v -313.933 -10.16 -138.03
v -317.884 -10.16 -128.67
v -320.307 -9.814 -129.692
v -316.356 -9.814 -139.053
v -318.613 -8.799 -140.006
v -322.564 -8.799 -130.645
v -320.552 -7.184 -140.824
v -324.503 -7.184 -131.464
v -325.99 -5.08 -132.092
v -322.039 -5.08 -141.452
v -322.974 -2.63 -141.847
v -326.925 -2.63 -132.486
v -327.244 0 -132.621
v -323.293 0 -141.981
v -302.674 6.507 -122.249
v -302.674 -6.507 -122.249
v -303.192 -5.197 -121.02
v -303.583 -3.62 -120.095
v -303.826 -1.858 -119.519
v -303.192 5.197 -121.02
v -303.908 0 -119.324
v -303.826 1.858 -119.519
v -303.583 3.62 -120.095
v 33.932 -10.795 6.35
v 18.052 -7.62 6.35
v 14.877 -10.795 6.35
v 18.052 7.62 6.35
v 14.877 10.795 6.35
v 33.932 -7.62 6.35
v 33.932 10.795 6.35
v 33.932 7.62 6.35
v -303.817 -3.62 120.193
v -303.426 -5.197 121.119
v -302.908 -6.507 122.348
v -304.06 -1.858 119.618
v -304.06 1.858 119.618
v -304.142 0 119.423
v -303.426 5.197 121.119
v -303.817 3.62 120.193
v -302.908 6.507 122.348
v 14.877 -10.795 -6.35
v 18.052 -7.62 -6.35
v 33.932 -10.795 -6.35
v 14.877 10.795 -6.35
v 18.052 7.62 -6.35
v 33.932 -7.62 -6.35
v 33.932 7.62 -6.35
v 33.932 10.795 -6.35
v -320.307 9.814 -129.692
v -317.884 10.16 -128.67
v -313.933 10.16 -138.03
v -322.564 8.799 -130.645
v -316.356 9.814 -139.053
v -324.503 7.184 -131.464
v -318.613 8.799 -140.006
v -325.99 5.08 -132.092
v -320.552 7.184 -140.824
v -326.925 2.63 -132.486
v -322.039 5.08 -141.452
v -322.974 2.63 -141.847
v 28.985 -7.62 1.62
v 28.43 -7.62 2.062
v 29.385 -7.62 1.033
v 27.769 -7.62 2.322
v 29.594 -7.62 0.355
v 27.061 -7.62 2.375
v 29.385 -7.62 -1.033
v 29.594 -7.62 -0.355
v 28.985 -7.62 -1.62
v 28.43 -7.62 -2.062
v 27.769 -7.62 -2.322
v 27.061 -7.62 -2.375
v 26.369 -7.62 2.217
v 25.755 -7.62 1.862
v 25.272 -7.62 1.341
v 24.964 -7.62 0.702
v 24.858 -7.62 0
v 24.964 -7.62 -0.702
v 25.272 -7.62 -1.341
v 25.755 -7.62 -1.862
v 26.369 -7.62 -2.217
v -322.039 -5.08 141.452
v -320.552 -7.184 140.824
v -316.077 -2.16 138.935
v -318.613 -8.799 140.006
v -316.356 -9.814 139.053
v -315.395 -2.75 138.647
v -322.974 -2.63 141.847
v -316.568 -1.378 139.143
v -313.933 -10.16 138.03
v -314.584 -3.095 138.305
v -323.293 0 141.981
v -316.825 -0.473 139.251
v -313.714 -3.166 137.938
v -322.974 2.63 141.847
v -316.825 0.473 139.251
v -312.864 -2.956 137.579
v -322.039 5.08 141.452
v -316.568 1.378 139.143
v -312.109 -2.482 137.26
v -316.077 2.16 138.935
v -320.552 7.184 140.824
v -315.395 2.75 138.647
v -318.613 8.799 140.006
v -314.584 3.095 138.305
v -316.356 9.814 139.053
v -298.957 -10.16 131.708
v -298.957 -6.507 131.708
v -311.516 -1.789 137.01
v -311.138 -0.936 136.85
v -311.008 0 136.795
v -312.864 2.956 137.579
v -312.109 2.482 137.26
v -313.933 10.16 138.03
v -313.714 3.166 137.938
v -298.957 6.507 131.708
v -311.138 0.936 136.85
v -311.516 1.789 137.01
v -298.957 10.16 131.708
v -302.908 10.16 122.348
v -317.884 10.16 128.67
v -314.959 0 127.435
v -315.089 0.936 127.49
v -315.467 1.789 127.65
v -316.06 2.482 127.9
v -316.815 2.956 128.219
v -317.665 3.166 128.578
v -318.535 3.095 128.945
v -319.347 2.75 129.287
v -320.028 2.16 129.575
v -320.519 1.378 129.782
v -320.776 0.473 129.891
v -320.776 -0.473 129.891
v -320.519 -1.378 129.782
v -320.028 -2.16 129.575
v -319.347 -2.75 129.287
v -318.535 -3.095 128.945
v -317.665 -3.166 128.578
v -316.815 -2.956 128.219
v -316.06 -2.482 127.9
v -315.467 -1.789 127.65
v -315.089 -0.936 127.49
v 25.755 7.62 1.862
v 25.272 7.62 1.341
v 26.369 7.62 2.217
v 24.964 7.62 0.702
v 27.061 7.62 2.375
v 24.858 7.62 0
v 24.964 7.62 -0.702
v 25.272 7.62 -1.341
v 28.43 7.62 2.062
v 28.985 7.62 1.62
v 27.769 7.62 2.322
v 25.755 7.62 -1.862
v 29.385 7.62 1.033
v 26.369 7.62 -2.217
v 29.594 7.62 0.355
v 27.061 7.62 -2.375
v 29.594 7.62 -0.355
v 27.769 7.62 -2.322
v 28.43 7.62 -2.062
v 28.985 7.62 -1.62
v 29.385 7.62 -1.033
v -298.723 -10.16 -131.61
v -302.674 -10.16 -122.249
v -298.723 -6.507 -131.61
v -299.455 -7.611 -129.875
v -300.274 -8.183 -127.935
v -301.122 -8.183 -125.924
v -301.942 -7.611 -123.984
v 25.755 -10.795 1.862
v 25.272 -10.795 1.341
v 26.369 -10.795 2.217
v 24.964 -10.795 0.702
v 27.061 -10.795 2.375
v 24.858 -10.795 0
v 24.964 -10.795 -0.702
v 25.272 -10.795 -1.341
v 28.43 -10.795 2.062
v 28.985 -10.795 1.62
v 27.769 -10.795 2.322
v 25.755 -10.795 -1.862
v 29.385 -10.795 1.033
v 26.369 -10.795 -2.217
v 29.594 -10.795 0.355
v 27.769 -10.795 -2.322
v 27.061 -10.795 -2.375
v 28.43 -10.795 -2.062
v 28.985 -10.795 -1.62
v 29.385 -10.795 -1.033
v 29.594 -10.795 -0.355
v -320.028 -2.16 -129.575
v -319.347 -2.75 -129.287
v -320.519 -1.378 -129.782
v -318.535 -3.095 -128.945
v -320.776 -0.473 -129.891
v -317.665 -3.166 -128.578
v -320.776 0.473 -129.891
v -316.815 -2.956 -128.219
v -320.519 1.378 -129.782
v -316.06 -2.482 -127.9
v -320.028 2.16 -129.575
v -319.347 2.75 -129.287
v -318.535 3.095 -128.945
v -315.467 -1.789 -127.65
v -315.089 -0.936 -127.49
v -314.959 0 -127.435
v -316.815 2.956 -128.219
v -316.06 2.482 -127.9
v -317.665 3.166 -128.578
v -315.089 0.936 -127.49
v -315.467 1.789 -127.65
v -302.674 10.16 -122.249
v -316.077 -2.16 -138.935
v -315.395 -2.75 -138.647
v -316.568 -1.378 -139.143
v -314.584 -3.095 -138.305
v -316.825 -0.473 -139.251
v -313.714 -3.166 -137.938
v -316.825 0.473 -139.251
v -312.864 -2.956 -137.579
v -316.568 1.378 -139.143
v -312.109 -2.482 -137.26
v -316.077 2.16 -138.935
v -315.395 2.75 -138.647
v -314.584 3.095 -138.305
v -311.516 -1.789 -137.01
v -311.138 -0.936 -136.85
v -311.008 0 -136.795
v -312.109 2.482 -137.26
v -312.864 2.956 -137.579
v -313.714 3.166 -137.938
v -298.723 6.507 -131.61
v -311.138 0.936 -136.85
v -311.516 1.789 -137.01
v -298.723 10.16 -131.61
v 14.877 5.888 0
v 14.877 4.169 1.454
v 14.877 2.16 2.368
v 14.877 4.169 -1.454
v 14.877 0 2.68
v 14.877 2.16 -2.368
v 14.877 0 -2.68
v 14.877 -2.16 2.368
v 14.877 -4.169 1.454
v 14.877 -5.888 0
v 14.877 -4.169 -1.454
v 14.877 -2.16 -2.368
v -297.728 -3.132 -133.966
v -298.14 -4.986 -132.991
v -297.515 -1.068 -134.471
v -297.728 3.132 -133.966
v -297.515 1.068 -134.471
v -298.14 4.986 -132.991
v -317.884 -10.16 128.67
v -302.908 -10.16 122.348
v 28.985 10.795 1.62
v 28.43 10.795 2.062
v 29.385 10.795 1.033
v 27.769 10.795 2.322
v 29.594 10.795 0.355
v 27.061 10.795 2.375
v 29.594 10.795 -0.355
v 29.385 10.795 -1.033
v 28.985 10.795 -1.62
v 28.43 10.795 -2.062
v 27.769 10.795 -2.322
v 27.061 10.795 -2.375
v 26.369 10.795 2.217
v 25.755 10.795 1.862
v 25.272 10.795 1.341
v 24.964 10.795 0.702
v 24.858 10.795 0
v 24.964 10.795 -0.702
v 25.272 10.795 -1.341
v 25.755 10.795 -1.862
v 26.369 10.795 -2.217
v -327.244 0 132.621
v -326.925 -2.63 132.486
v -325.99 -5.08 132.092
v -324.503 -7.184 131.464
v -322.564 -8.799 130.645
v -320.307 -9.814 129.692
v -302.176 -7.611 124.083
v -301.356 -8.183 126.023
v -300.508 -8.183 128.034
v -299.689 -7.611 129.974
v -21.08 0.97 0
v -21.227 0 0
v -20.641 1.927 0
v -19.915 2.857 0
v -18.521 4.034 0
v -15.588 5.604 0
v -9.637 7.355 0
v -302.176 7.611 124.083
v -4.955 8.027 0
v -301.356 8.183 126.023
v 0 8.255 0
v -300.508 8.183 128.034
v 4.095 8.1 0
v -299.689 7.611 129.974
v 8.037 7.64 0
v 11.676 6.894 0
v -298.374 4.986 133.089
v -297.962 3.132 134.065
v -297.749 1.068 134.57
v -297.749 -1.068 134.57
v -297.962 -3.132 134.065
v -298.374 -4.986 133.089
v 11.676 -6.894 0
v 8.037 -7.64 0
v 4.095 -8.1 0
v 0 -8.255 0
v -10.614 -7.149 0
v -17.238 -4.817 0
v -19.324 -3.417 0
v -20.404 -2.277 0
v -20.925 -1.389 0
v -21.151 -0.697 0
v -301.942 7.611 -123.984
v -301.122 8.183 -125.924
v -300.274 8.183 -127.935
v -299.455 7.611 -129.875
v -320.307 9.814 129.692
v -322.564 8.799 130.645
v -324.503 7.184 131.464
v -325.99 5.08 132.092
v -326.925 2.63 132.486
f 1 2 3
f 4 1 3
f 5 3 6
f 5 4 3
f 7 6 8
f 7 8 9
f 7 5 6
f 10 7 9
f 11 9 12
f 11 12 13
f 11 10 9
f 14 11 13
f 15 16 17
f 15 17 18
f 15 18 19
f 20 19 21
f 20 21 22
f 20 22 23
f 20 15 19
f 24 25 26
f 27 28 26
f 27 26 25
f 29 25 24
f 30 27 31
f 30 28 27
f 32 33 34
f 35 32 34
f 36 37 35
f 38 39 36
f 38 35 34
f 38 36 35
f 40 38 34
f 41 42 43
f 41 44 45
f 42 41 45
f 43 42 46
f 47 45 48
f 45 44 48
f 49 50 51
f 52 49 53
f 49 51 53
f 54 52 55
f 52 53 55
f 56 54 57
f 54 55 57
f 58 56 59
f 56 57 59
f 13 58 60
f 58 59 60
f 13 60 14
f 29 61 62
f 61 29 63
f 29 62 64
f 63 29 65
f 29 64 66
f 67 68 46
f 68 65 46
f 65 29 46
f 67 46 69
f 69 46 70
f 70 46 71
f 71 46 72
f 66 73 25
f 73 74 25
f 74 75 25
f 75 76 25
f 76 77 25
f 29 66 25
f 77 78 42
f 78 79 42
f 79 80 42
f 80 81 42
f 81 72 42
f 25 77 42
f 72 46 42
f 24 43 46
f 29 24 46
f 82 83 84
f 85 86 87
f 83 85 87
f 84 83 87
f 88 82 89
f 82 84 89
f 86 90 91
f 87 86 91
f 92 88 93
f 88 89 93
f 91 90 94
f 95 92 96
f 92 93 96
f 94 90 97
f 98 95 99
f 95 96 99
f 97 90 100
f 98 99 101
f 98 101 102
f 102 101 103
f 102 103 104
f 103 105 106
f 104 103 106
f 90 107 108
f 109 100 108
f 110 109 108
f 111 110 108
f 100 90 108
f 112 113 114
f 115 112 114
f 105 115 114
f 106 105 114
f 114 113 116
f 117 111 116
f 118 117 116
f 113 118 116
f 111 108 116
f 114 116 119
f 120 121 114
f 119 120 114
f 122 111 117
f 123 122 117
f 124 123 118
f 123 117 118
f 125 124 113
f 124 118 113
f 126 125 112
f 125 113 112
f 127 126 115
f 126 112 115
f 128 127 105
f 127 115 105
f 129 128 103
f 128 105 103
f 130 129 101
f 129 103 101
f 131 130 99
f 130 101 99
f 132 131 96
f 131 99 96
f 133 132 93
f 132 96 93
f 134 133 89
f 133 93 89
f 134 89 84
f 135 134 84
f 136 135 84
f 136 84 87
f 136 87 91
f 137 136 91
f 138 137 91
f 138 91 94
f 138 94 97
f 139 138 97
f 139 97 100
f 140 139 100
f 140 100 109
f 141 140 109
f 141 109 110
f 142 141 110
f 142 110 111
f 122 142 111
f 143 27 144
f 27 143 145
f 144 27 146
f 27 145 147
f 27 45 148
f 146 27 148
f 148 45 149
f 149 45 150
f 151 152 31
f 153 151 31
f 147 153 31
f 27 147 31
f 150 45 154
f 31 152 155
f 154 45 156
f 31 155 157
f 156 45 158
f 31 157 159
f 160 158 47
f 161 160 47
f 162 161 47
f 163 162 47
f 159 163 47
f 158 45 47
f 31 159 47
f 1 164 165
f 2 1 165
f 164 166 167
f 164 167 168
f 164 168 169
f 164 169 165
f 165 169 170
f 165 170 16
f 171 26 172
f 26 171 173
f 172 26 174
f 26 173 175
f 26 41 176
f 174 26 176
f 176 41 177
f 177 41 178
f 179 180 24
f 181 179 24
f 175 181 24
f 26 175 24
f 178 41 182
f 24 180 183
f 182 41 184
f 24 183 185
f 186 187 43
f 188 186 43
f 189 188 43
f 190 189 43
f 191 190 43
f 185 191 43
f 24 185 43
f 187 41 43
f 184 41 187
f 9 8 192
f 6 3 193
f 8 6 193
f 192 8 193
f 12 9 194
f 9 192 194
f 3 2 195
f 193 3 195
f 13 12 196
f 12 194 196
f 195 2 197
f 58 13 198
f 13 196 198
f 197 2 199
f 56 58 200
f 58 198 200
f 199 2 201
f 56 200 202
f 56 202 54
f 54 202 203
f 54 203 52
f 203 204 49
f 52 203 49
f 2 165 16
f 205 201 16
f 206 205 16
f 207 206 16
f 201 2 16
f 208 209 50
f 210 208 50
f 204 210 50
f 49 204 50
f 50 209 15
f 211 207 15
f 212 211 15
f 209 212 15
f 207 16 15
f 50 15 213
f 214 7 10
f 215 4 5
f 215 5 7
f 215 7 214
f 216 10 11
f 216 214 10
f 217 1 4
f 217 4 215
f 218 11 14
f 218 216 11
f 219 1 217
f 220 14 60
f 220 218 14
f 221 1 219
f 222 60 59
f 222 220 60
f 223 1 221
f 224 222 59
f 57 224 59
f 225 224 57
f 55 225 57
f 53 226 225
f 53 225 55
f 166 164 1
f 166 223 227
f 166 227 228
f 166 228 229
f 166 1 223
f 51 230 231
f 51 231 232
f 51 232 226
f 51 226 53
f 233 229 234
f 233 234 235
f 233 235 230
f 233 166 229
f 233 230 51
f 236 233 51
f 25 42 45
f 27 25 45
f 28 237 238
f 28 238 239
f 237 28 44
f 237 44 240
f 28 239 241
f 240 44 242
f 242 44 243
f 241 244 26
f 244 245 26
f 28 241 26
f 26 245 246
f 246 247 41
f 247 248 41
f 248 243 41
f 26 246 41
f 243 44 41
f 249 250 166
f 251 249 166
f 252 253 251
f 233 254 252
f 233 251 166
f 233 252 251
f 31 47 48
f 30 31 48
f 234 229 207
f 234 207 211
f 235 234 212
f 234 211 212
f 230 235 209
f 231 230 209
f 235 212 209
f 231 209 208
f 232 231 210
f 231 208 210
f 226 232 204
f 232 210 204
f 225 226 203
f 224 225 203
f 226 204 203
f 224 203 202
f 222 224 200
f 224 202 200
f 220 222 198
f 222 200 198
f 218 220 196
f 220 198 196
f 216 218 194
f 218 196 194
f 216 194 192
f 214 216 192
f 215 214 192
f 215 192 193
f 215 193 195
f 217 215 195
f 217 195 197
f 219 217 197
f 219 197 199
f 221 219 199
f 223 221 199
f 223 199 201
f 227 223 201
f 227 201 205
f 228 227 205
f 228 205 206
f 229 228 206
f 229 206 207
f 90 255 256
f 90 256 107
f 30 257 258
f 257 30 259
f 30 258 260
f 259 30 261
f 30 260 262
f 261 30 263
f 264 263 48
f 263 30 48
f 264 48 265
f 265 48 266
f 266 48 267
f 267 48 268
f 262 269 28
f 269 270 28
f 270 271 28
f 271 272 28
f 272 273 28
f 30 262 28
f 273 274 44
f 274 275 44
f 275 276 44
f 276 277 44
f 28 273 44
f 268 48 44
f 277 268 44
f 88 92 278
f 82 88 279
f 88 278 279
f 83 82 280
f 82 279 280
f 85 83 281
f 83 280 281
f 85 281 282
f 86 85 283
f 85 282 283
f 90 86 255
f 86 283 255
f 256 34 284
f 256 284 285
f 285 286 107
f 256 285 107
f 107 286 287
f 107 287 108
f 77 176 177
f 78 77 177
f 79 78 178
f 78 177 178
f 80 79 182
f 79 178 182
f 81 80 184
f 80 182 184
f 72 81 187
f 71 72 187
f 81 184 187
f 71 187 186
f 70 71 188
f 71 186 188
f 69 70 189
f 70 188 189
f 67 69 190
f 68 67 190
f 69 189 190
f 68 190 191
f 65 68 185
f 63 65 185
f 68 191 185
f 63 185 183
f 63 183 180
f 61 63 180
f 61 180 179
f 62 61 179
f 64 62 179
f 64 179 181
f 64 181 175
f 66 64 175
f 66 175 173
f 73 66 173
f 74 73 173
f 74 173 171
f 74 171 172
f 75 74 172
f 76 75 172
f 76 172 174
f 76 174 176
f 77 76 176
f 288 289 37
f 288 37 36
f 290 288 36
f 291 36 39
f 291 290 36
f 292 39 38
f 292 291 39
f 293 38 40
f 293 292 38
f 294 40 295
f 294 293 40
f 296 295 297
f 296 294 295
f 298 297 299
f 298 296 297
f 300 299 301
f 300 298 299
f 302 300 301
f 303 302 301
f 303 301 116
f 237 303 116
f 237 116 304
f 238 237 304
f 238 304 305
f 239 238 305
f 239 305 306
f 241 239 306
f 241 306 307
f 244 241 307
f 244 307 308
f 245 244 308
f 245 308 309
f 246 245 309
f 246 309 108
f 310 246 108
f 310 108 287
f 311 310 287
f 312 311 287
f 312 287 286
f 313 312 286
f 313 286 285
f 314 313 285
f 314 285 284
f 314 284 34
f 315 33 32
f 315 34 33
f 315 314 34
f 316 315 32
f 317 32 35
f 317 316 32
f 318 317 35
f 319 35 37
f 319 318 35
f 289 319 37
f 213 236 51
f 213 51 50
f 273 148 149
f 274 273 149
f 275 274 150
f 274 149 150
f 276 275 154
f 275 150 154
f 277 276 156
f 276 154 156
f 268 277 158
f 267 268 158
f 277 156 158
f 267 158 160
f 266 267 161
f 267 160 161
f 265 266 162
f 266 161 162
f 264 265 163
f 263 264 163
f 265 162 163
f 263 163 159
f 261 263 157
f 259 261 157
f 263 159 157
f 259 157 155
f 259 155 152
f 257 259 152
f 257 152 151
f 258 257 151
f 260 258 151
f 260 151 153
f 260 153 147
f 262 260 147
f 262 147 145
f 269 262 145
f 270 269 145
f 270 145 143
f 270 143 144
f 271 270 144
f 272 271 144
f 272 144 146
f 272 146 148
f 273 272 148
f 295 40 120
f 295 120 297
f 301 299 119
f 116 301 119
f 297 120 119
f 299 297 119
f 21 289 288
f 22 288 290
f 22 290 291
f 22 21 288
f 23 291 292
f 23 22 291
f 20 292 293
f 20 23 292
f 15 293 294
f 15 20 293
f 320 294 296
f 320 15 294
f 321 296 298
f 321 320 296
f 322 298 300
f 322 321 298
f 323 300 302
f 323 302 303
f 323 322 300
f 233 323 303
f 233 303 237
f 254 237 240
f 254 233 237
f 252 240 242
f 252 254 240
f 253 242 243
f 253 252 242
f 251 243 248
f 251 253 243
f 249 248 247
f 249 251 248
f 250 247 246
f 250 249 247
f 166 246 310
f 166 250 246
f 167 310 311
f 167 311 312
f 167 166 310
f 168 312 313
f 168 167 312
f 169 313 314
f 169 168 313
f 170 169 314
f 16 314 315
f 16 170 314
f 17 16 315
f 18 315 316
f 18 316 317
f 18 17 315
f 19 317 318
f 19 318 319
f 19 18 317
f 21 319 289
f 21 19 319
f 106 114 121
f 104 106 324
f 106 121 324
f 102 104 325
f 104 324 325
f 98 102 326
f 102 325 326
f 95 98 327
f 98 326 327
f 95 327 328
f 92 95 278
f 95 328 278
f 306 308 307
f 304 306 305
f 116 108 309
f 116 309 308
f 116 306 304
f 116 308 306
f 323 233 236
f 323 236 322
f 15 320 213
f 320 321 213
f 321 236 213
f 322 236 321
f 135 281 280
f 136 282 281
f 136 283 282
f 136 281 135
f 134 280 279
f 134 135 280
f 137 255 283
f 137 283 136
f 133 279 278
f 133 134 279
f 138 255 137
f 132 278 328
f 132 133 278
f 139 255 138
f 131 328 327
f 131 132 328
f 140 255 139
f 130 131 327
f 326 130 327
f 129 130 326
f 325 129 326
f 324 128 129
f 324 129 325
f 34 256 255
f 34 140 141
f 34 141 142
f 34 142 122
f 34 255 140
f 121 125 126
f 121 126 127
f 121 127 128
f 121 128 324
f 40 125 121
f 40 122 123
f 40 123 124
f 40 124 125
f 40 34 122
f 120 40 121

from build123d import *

# Parameters (mm, degrees)
SKETCH2_R                      = 8.255
BOSS_EXTRUDE1_DEPTH            = 6.35
BOSS_EXTRUDE1_DEPTH_BACK       = 6.35
BOSS_EXTRUDE2_DEPTH            = 10.16
BOSS_EXTRUDE2_DEPTH_BACK       = 16.256
SKETCH4_W                      = 10.16
SKETCH4_H                      = 20.32
BOSS_EXTRUDE3_DEPTH            = 10.16
BOSS_EXTRUDE3_DEPTH_BACK       = 16.51
SKETCH5_W                      = 10.16
SKETCH5_H                      = 20.32
CUT_EXTRUDE3_DEPTH             = 361.571509311
CUT_EXTRUDE4_DEPTH             = 357.967583958
CUT_EXTRUDE5_DEPTH             = 16.51
CUT_EXTRUDE6_START             = -16.256
CUT_EXTRUDE6_DEPTH             = 16.256
E_0_25_DIAMETER_HOLE2_D        = 6.35
E_0_25_DIAMETER_HOLE2_DEPTH    = 19.05
E_0_25_DIAMETER_HOLE2_TIP      = 1.907732465
E_0_25_DIAMETER_HOLE3_D        = 6.35
E_0_25_DIAMETER_HOLE3_DEPTH    = 19.05
E_0_25_DIAMETER_HOLE3_TIP      = 1.907732465
CUT_EXTRUDE7_DEPTH             = 360.454492653
F_3_16_0_1875_DIAMETER_HOLE1_D = 4.7625


with BuildPart() as part:
    # Sweep1: sweep along a path in Sketch1
    with BuildLine(Plane(origin=(0, 0, 0), x_dir=(1, 0, 0), z_dir=(0, 1, 0))) as sweep1_path:
        Line((-315.908511281, -133.35), (0, 0))
        Line((0, 0), (-315.908511281, 133.35))
    # Sketch2 → Sweep1 (sweep)
    with BuildSketch(Plane(origin=(-315.908511281, 0, 133.35), x_dir=(-0.3888888888888888, 0, -0.9212846639876112), z_dir=(0.9212846639876112, 0, -0.3888888888888888))):
        Circle(SKETCH2_R)
    sweep(path=sweep1_path.line, transition=Transition.RIGHT)

    # Sketch3 → Boss-Extrude1 (add, two sides: drawn at the far end of the back side and taken through both)
    with BuildSketch(Plane.XY.offset(-BOSS_EXTRUDE1_DEPTH_BACK)):
        Polygon((33.931753368, 10.795), (14.877142857, 10.795), (14.877142857, -10.795), (33.931753368, -10.795), (33.931753368, -7.62), (18.052142857, -7.62), (18.052142857, 7.62), (33.931753368, 7.62), align=None)
    extrude(amount=BOSS_EXTRUDE1_DEPTH + BOSS_EXTRUDE1_DEPTH_BACK)

    # Sketch4 → Boss-Extrude2 (add, two sides: drawn at the far end of the back side and taken through both)
    with BuildSketch(Plane(origin=(-315.908511281, 0, 133.35), x_dir=(0.38888888888888873, 0, 0.9212846639876112), z_dir=(-0.9212846639876112, 0, 0.38888888888888873)).offset(-BOSS_EXTRUDE2_DEPTH_BACK)):
        Rectangle(SKETCH4_W, SKETCH4_H)
    extrude(amount=BOSS_EXTRUDE2_DEPTH + BOSS_EXTRUDE2_DEPTH_BACK)

    # Sketch5 → Boss-Extrude3 (add, two sides: drawn at the far end of the back side and taken through both)
    with BuildSketch(Plane(origin=(-315.908511281, 0, -133.35), x_dir=(-0.38888888888888895, 0, 0.921284663987611), z_dir=(-0.921284663987611, 0, -0.38888888888888895)).offset(-BOSS_EXTRUDE3_DEPTH_BACK)):
        Rectangle(SKETCH5_W, SKETCH5_H)
    extrude(amount=BOSS_EXTRUDE3_DEPTH + BOSS_EXTRUDE3_DEPTH_BACK)

    # Sketch12 → Cut-Extrude3 (cut, through all)
    with BuildSketch(Plane(origin=(1.975555556, 0, -4.680126093), x_dir=(-0.9212846639876111, 0, -0.38888888888888895), z_dir=(0.3888888888888889, 0, -0.921284663987611))):
        with BuildLine():
            Line((353.06, 0), (353.06, 10.16))
            Line((353.06, 10.16), (342.9, 10.16))
            ThreePointArc((342.9, 10.16), (350.084204897, 7.184204897), (353.06, 0))
        make_face()
    cut_extrude3 = extrude(amount=-CUT_EXTRUDE3_DEPTH, mode=Mode.SUBTRACT)

    # Sketch13 → Cut-Extrude4 (cut, through all)
    with BuildSketch(Plane(origin=(-1.975555556, 0, -4.680126093), x_dir=(-0.9212846639876111, 0, 0.3888888888888888), z_dir=(-0.3888888888888888, 0, -0.9212846639876111))):
        with BuildLine():
            Line((353.06, 10.16), (342.9, 10.16))
            ThreePointArc((342.9, 10.16), (350.084204897, 7.184204897), (353.06, 0))
            Line((353.06, 0), (353.06, 10.16))
        make_face()
        with BuildLine():
            Line((353.06, -10.16), (353.06, 0))
            ThreePointArc((353.06, 0), (350.084204897, -7.184204897), (342.9, -10.16))
            Line((342.9, -10.16), (353.06, -10.16))
        make_face()
    extrude(amount=-CUT_EXTRUDE4_DEPTH, mode=Mode.SUBTRACT)

    # Mirror3: Cut-Extrude3 across plane
    add(cut_extrude3.mirror(Plane.ZX), mode=Mode.SUBTRACT)

    # Sketch14 → Cut-Extrude5 (cut)
    with BuildSketch(Plane(origin=(-315.908511281, 0, -133.35), x_dir=(-0.38888888888888906, 0, 0.921284663987611), z_dir=(-0.9212846639876111, 0, -0.3888888888888891))):
        with BuildLine():
            Line((5.08, 6.506813736), (5.08, -6.506813736))
            ThreePointArc((5.08, -6.506813736), (8.255, 0), (5.08, 6.506813736))
        make_face()
        with BuildLine():
            Line((-5.08, -6.506813736), (-5.08, 6.506813736))
            ThreePointArc((-5.08, 6.506813736), (-8.255, 0), (-5.08, -6.506813736))
        make_face()
    extrude(amount=-CUT_EXTRUDE5_DEPTH, mode=Mode.SUBTRACT)

    # Sketch15 → Cut-Extrude6 (cut)
    with BuildSketch(Plane(origin=(-315.908511281, 0, 133.35), x_dir=(0.38888888888888884, 0, 0.9212846639876111), z_dir=(-0.9212846639876111, 0, 0.38888888888888884)).offset(CUT_EXTRUDE6_START)):
        with BuildLine():
            Line((5.08, 6.506813736), (5.08, -6.506813736))
            ThreePointArc((5.08, -6.506813736), (8.255, 0), (5.08, 6.506813736))
        make_face()
        with BuildLine():
            Line((-5.08, -6.506813736), (-5.08, 6.506813736))
            ThreePointArc((-5.08, 6.506813736), (-8.255, 0), (-5.08, -6.506813736))
        make_face()
    extrude(amount=CUT_EXTRUDE6_DEPTH, mode=Mode.SUBTRACT)

    # E (0.25) Diameter Hole2
    with Locations(Plane(origin=(1.975555556, 0, -4.680126093), x_dir=(-0.9212846639876111, 0, -0.38888888888888895), z_dir=(0.3888888888888889, 0, -0.921284663987611))):
        with Locations((342.9, 0)):
            Hole(E_0_25_DIAMETER_HOLE2_D / 2, depth=E_0_25_DIAMETER_HOLE2_DEPTH)
            with Locations((0, 0, -(E_0_25_DIAMETER_HOLE2_DEPTH + E_0_25_DIAMETER_HOLE2_TIP / 2))):  # 118° drill point
                Cone(0, E_0_25_DIAMETER_HOLE2_D / 2, E_0_25_DIAMETER_HOLE2_TIP, mode=Mode.SUBTRACT)

    # E (0.25) Diameter Hole3
    with Locations(Plane(origin=(-1.975555556, 0, -4.680126093), x_dir=(-0.9212846639876111, 0, 0.3888888888888888), z_dir=(-0.3888888888888888, 0, -0.9212846639876111))):
        with Locations((342.9, 0)):
            Hole(E_0_25_DIAMETER_HOLE3_D / 2, depth=E_0_25_DIAMETER_HOLE3_DEPTH)
            with Locations((0, 0, -(E_0_25_DIAMETER_HOLE3_DEPTH + E_0_25_DIAMETER_HOLE3_TIP / 2))):  # 118° drill point
                Cone(0, E_0_25_DIAMETER_HOLE3_D / 2, E_0_25_DIAMETER_HOLE3_TIP, mode=Mode.SUBTRACT)

    # Sketch20 → Cut-Extrude7 (cut, through all)
    with BuildSketch(Plane.XY.offset(6.35)):
        with BuildLine():
            Line((18.052142857, 4.342893612), (18.052142857, -4.342893612))
            add(Edge.make_bspline(
                [(18.052142857, -4.342893612), (24.960559943, 0), (18.052142857, 4.342893612)],
                knots=[5.729186052, 5.729186052, 5.729186052, 6.837184562, 6.837184562, 6.837184562], degree=2, weights=[1, 0.85042735, 1]))
        make_face()
    extrude(amount=-CUT_EXTRUDE7_DEPTH, mode=Mode.SUBTRACT)

    # 3/16 (0.1875) Diameter Hole1 (through all)
    with Locations(Plane(origin=(0, 10.795, 0), x_dir=(1, 0, 0), z_dir=(0, 1, 0))):
        with Locations((27.239219, 0)):
            Hole(F_3_16_0_1875_DIAMETER_HOLE1_D / 2)


solid = part.part
